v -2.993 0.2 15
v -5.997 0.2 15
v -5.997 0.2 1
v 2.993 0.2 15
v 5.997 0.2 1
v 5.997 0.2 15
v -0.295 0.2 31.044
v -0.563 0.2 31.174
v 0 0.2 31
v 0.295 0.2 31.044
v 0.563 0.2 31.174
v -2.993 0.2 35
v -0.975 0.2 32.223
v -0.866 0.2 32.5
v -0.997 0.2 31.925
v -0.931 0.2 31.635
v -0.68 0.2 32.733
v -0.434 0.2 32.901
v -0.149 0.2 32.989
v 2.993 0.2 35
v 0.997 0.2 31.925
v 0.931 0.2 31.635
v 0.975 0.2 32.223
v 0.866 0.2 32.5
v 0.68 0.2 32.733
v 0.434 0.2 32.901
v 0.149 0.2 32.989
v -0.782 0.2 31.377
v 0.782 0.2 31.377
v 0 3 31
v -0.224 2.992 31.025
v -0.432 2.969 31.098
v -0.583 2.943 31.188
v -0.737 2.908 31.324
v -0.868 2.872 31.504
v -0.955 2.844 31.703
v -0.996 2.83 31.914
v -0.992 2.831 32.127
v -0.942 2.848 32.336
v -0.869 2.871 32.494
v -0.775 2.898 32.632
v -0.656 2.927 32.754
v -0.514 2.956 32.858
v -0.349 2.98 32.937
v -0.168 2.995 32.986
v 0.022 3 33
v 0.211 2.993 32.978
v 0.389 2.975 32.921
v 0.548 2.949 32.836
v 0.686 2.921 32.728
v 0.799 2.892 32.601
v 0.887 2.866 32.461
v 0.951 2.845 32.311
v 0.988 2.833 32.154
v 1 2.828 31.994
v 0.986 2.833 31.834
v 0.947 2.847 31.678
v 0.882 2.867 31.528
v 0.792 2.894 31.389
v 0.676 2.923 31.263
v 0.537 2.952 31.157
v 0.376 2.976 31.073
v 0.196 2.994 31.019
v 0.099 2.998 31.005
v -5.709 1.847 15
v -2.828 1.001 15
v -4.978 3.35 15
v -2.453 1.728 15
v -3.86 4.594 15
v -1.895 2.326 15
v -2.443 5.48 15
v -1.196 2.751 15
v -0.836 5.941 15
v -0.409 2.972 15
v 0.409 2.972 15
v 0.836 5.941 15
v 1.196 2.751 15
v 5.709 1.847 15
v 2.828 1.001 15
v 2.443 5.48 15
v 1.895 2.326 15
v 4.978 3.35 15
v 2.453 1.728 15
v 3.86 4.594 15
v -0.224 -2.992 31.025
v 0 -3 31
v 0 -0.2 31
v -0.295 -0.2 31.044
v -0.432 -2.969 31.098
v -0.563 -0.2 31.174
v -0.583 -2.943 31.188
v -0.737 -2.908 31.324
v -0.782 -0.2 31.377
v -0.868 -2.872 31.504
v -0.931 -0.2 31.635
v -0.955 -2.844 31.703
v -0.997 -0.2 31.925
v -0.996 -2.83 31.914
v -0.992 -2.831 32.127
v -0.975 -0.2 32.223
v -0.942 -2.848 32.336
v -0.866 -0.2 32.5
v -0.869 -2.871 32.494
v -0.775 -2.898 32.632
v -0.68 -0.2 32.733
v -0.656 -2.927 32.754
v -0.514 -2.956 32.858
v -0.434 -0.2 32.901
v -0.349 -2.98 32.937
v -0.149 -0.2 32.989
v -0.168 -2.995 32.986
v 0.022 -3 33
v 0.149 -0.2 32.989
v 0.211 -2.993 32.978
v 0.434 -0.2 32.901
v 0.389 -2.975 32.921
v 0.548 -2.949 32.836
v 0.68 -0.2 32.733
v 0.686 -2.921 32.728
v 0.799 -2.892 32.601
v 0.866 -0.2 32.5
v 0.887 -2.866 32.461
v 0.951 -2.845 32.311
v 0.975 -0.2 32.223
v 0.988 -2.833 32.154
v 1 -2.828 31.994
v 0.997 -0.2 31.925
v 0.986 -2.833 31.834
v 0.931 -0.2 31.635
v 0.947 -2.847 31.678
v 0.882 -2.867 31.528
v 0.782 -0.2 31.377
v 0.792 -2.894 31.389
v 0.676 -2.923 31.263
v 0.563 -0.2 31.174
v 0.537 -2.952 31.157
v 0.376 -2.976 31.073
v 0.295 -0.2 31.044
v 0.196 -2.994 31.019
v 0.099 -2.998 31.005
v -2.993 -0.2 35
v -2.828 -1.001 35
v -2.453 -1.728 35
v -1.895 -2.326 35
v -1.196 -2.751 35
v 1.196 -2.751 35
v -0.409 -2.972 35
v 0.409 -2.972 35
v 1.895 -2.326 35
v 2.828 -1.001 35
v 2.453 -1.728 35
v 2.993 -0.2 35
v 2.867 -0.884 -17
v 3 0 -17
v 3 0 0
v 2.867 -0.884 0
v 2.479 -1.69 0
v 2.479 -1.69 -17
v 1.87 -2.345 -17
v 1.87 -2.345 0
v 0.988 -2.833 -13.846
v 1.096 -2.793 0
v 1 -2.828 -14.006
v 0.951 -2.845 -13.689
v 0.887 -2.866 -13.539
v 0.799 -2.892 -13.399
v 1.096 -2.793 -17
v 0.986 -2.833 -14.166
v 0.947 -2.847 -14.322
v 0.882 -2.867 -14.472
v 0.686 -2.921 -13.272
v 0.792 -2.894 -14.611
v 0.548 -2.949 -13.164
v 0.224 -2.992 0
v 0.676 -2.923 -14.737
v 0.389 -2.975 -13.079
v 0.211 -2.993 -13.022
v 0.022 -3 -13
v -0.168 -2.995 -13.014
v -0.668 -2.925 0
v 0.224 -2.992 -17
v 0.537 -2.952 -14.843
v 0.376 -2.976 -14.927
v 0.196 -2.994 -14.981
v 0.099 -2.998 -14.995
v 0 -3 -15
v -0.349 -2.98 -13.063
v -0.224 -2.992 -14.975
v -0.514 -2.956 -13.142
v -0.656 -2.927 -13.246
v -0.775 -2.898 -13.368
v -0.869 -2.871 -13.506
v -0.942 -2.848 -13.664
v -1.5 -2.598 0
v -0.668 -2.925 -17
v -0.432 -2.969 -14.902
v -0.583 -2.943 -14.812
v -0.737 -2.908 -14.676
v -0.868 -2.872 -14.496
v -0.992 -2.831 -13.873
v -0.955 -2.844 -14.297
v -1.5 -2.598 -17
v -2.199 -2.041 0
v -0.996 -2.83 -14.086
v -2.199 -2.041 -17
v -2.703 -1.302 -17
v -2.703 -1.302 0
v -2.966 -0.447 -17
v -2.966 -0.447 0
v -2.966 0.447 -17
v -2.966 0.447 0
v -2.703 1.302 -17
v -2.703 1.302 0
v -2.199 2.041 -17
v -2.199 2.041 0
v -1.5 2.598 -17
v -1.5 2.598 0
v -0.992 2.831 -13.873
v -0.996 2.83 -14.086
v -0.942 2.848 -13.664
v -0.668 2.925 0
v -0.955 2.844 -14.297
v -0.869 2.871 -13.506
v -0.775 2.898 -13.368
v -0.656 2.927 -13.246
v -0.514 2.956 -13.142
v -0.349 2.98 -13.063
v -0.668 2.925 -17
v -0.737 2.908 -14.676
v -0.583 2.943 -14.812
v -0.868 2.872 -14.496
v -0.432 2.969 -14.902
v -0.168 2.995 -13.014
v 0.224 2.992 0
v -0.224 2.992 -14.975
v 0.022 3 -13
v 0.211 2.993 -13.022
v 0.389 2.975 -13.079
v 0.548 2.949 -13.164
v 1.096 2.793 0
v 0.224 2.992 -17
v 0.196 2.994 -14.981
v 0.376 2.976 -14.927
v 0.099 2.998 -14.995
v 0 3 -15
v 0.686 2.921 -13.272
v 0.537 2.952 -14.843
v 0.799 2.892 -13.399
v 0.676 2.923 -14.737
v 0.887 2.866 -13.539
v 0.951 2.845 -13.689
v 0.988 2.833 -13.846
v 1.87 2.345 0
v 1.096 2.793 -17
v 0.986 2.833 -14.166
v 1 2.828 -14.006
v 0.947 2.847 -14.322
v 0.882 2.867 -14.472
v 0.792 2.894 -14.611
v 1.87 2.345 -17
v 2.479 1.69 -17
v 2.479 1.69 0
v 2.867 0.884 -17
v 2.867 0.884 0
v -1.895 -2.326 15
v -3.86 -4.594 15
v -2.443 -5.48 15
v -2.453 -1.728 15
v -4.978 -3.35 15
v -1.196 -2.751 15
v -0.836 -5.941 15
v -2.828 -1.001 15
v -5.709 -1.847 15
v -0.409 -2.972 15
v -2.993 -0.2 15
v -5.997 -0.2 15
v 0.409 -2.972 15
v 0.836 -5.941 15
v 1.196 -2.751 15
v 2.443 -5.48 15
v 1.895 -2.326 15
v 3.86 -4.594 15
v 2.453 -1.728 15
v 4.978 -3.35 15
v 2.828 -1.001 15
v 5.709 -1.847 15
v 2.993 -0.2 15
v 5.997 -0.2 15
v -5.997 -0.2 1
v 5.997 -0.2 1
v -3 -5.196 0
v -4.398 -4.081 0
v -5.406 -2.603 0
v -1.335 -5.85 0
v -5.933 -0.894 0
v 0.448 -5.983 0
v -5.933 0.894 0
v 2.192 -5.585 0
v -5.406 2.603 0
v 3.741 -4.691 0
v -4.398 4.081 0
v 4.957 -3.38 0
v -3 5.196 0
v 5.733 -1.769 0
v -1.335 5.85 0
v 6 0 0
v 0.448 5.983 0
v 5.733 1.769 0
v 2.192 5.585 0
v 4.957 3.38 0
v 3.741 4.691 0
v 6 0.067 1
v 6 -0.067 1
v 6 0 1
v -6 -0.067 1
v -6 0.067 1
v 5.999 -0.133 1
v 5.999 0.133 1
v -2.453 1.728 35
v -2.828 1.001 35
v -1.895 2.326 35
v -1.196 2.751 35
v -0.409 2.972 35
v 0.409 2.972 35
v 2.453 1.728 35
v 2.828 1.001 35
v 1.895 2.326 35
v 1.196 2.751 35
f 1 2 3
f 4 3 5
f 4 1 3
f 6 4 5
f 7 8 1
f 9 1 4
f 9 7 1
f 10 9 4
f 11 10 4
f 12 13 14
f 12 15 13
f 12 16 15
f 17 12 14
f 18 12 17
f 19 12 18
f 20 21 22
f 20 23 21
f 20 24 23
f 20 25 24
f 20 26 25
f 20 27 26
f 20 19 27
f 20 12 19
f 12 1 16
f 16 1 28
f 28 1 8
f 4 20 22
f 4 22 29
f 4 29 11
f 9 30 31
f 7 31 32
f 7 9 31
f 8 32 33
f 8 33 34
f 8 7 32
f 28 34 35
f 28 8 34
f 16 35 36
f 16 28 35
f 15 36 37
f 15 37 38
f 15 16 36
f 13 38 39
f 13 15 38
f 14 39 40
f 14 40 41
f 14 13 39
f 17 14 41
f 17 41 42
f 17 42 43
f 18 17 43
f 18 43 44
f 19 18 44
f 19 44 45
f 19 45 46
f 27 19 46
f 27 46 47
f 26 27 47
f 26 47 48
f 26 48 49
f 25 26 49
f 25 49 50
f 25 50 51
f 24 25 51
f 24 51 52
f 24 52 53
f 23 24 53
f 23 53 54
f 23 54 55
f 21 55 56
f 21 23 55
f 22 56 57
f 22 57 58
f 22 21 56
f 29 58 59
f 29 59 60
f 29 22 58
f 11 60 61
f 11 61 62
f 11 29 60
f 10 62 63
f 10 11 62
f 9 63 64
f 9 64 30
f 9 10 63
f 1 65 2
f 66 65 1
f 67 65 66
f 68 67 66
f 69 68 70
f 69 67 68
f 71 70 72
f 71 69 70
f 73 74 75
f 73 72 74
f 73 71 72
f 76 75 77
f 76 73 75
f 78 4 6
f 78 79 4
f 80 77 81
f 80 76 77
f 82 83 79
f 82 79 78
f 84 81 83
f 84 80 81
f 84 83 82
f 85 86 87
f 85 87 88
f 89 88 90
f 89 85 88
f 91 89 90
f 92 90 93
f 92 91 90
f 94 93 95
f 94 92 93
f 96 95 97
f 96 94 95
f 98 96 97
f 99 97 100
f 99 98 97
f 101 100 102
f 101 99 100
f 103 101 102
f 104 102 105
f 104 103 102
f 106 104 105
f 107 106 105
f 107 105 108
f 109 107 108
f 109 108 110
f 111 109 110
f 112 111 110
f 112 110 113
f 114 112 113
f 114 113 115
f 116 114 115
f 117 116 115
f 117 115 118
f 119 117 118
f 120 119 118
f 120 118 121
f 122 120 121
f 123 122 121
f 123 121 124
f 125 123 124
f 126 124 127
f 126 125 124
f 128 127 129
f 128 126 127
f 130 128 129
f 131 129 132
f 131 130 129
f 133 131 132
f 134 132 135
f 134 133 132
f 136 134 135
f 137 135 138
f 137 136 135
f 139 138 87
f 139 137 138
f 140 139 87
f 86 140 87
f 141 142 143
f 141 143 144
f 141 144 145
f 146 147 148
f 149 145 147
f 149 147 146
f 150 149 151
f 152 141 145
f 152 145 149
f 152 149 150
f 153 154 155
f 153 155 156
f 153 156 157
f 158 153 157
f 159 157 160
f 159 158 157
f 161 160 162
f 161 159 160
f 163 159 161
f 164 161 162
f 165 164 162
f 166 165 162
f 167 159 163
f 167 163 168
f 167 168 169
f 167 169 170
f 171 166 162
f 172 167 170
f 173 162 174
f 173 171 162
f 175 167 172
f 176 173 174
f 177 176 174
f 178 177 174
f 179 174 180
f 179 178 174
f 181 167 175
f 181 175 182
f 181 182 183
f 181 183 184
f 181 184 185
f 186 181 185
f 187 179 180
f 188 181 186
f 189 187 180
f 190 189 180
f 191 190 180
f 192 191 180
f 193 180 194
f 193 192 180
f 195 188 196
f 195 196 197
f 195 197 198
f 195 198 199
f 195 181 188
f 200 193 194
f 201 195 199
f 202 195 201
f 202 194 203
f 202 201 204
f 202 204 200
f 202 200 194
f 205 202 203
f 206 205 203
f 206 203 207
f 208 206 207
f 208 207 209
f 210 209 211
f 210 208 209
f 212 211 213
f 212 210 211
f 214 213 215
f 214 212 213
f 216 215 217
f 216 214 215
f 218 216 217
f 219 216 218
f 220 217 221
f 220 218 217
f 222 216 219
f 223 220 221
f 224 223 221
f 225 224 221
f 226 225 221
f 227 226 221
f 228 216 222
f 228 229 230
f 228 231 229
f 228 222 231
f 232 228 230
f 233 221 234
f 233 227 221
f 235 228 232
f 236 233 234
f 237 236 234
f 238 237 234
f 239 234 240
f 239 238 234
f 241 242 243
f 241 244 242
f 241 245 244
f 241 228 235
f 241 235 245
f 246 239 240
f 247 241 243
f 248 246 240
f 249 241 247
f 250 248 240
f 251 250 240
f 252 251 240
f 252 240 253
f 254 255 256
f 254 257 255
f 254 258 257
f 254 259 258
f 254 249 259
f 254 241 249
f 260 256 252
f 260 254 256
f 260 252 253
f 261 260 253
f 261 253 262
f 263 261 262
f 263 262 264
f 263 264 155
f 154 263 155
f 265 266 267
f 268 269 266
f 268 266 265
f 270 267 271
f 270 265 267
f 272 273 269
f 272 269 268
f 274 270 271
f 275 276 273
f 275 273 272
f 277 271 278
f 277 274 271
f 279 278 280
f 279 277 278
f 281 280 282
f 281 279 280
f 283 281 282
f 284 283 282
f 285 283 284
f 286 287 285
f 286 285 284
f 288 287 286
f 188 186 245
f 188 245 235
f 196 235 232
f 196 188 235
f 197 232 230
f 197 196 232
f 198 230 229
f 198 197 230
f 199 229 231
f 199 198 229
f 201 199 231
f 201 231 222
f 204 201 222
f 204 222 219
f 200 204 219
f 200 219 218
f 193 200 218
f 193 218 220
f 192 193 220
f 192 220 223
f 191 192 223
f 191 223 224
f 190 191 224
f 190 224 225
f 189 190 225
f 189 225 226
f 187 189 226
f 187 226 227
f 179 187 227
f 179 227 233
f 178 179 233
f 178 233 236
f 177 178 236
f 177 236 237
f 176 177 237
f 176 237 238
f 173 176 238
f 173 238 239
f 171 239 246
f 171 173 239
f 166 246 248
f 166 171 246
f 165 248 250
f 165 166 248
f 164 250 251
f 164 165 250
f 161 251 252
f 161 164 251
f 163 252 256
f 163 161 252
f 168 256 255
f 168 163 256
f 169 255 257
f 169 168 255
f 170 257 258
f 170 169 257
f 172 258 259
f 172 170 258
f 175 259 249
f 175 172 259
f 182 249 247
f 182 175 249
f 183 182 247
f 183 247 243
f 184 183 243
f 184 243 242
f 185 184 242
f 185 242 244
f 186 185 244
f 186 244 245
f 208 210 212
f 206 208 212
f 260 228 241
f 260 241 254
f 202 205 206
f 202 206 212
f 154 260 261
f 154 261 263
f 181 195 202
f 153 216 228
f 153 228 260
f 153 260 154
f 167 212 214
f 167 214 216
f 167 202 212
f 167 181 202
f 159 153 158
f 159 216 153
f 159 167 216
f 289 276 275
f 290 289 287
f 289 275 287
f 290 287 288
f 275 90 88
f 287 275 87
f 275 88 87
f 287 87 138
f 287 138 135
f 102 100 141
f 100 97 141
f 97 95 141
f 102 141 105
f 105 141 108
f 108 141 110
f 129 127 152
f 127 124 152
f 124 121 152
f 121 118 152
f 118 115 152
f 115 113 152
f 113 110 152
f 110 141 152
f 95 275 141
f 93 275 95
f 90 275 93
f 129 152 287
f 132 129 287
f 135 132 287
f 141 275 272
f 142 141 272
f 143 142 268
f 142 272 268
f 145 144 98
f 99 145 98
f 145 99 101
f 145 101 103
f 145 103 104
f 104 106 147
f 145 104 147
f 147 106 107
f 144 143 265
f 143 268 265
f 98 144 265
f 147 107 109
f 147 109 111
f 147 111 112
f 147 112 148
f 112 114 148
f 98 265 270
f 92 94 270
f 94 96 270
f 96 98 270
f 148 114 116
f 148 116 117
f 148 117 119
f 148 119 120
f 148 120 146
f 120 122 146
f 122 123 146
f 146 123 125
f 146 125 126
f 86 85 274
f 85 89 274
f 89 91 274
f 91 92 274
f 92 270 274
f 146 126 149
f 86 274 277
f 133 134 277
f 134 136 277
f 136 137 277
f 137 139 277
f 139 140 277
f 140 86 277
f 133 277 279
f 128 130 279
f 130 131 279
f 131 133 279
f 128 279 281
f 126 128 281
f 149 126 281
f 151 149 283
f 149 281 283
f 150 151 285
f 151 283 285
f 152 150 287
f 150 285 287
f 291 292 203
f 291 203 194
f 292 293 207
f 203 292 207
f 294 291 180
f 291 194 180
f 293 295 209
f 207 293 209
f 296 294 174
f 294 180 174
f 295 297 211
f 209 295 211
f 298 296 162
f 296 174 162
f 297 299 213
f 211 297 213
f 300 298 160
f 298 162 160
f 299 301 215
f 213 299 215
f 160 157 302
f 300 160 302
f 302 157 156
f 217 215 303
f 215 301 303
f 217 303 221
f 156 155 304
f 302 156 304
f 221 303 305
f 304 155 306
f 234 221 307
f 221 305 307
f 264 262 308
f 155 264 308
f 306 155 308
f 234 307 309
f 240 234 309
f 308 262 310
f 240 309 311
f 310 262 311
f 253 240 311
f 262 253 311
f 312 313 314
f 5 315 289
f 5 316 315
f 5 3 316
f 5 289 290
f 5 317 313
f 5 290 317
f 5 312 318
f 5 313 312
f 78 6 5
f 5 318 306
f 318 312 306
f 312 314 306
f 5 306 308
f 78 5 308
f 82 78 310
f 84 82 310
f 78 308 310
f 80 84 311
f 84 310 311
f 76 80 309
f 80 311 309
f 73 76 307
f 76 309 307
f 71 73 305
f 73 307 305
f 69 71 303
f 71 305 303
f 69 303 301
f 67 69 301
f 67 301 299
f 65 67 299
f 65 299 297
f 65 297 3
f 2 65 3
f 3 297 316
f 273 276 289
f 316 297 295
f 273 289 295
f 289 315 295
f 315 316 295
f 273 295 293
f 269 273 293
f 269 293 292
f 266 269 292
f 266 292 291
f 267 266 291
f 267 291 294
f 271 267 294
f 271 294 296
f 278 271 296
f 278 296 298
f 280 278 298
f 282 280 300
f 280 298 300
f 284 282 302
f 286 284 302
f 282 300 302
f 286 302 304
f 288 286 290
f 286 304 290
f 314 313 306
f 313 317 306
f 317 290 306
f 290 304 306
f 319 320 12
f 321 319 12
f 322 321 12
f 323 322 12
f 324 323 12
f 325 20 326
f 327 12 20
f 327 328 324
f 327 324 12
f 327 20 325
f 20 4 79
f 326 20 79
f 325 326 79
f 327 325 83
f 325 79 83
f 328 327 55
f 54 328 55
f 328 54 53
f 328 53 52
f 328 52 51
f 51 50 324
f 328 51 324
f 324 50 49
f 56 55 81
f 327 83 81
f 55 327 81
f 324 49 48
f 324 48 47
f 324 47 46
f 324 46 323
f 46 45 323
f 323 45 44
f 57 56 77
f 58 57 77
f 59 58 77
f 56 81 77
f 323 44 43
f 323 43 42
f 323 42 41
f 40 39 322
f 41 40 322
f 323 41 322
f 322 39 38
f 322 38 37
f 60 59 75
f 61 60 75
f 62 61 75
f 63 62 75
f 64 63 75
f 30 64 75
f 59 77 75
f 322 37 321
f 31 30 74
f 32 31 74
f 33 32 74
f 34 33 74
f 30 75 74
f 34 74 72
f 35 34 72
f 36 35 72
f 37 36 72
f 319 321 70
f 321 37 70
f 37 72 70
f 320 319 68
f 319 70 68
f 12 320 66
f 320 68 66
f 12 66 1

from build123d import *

# Parameters (mm, degrees)
SKETCH_1_R               = 6
EXTRUDE_1_DEPTH          = 15
SKETCH_2_R               = 3
EXTRUDE_2_DEPTH          = 20
EXTRUDE_START            = 17
SKETCH_3_R               = 3
EXTRUDE_3_DEPTH          = 17
CUT_EXTRUDE_1_DEPTH      = 10
CUT_EXTRUDE_1_DEPTH_BACK = 10
SKETCH_5_R               = 1
SKETCH_7_W               = 14.322953254
SKETCH_7_H               = 0.4
CUT_EXTRUDE_2_DEPTH      = 34


with BuildPart() as part:
    # 草图1 → 凸台-拉伸1 (new body)
    with BuildSketch(Plane.XY):
        Circle(SKETCH_1_R)
    extrude(amount=EXTRUDE_1_DEPTH)

    # 草图2 → 凸台-拉伸2 (add)
    with BuildSketch(Plane.XY.offset(15)):
        Circle(SKETCH_2_R)
    extrude(amount=EXTRUDE_2_DEPTH)

    # 草图3 → 凸台-拉伸3 (add)
    with BuildSketch(Plane(origin=(0, 0, 0), x_dir=(-1, 0, 0), z_dir=(0, 0, -1)).offset(EXTRUDE_START)):
        Circle(SKETCH_3_R)
    extrude(amount=-EXTRUDE_3_DEPTH)

    # 草图5 → 切除-拉伸1 (cut, two sides: drawn at the far end of the back side and taken through both)
    with BuildSketch(Plane(origin=(0, 0, 0), x_dir=(1, 0, 0), z_dir=(0, 1, 0)).offset(-CUT_EXTRUDE_1_DEPTH_BACK)):
        with Locations((0, -32)):
            Circle(SKETCH_5_R)
        with Locations((0, 14)):
            Circle(SKETCH_5_R)
    extrude(amount=CUT_EXTRUDE_1_DEPTH + CUT_EXTRUDE_1_DEPTH_BACK, mode=Mode.SUBTRACT)

    # 草图7 → 切除-拉伸2 (cut)
    with BuildSketch(Plane.XY.offset(35)):
        with Locations((-0.299039341, 0)):
            Rectangle(SKETCH_7_W, SKETCH_7_H)
    extrude(amount=-CUT_EXTRUDE_2_DEPTH, mode=Mode.SUBTRACT)


solid = part.part
